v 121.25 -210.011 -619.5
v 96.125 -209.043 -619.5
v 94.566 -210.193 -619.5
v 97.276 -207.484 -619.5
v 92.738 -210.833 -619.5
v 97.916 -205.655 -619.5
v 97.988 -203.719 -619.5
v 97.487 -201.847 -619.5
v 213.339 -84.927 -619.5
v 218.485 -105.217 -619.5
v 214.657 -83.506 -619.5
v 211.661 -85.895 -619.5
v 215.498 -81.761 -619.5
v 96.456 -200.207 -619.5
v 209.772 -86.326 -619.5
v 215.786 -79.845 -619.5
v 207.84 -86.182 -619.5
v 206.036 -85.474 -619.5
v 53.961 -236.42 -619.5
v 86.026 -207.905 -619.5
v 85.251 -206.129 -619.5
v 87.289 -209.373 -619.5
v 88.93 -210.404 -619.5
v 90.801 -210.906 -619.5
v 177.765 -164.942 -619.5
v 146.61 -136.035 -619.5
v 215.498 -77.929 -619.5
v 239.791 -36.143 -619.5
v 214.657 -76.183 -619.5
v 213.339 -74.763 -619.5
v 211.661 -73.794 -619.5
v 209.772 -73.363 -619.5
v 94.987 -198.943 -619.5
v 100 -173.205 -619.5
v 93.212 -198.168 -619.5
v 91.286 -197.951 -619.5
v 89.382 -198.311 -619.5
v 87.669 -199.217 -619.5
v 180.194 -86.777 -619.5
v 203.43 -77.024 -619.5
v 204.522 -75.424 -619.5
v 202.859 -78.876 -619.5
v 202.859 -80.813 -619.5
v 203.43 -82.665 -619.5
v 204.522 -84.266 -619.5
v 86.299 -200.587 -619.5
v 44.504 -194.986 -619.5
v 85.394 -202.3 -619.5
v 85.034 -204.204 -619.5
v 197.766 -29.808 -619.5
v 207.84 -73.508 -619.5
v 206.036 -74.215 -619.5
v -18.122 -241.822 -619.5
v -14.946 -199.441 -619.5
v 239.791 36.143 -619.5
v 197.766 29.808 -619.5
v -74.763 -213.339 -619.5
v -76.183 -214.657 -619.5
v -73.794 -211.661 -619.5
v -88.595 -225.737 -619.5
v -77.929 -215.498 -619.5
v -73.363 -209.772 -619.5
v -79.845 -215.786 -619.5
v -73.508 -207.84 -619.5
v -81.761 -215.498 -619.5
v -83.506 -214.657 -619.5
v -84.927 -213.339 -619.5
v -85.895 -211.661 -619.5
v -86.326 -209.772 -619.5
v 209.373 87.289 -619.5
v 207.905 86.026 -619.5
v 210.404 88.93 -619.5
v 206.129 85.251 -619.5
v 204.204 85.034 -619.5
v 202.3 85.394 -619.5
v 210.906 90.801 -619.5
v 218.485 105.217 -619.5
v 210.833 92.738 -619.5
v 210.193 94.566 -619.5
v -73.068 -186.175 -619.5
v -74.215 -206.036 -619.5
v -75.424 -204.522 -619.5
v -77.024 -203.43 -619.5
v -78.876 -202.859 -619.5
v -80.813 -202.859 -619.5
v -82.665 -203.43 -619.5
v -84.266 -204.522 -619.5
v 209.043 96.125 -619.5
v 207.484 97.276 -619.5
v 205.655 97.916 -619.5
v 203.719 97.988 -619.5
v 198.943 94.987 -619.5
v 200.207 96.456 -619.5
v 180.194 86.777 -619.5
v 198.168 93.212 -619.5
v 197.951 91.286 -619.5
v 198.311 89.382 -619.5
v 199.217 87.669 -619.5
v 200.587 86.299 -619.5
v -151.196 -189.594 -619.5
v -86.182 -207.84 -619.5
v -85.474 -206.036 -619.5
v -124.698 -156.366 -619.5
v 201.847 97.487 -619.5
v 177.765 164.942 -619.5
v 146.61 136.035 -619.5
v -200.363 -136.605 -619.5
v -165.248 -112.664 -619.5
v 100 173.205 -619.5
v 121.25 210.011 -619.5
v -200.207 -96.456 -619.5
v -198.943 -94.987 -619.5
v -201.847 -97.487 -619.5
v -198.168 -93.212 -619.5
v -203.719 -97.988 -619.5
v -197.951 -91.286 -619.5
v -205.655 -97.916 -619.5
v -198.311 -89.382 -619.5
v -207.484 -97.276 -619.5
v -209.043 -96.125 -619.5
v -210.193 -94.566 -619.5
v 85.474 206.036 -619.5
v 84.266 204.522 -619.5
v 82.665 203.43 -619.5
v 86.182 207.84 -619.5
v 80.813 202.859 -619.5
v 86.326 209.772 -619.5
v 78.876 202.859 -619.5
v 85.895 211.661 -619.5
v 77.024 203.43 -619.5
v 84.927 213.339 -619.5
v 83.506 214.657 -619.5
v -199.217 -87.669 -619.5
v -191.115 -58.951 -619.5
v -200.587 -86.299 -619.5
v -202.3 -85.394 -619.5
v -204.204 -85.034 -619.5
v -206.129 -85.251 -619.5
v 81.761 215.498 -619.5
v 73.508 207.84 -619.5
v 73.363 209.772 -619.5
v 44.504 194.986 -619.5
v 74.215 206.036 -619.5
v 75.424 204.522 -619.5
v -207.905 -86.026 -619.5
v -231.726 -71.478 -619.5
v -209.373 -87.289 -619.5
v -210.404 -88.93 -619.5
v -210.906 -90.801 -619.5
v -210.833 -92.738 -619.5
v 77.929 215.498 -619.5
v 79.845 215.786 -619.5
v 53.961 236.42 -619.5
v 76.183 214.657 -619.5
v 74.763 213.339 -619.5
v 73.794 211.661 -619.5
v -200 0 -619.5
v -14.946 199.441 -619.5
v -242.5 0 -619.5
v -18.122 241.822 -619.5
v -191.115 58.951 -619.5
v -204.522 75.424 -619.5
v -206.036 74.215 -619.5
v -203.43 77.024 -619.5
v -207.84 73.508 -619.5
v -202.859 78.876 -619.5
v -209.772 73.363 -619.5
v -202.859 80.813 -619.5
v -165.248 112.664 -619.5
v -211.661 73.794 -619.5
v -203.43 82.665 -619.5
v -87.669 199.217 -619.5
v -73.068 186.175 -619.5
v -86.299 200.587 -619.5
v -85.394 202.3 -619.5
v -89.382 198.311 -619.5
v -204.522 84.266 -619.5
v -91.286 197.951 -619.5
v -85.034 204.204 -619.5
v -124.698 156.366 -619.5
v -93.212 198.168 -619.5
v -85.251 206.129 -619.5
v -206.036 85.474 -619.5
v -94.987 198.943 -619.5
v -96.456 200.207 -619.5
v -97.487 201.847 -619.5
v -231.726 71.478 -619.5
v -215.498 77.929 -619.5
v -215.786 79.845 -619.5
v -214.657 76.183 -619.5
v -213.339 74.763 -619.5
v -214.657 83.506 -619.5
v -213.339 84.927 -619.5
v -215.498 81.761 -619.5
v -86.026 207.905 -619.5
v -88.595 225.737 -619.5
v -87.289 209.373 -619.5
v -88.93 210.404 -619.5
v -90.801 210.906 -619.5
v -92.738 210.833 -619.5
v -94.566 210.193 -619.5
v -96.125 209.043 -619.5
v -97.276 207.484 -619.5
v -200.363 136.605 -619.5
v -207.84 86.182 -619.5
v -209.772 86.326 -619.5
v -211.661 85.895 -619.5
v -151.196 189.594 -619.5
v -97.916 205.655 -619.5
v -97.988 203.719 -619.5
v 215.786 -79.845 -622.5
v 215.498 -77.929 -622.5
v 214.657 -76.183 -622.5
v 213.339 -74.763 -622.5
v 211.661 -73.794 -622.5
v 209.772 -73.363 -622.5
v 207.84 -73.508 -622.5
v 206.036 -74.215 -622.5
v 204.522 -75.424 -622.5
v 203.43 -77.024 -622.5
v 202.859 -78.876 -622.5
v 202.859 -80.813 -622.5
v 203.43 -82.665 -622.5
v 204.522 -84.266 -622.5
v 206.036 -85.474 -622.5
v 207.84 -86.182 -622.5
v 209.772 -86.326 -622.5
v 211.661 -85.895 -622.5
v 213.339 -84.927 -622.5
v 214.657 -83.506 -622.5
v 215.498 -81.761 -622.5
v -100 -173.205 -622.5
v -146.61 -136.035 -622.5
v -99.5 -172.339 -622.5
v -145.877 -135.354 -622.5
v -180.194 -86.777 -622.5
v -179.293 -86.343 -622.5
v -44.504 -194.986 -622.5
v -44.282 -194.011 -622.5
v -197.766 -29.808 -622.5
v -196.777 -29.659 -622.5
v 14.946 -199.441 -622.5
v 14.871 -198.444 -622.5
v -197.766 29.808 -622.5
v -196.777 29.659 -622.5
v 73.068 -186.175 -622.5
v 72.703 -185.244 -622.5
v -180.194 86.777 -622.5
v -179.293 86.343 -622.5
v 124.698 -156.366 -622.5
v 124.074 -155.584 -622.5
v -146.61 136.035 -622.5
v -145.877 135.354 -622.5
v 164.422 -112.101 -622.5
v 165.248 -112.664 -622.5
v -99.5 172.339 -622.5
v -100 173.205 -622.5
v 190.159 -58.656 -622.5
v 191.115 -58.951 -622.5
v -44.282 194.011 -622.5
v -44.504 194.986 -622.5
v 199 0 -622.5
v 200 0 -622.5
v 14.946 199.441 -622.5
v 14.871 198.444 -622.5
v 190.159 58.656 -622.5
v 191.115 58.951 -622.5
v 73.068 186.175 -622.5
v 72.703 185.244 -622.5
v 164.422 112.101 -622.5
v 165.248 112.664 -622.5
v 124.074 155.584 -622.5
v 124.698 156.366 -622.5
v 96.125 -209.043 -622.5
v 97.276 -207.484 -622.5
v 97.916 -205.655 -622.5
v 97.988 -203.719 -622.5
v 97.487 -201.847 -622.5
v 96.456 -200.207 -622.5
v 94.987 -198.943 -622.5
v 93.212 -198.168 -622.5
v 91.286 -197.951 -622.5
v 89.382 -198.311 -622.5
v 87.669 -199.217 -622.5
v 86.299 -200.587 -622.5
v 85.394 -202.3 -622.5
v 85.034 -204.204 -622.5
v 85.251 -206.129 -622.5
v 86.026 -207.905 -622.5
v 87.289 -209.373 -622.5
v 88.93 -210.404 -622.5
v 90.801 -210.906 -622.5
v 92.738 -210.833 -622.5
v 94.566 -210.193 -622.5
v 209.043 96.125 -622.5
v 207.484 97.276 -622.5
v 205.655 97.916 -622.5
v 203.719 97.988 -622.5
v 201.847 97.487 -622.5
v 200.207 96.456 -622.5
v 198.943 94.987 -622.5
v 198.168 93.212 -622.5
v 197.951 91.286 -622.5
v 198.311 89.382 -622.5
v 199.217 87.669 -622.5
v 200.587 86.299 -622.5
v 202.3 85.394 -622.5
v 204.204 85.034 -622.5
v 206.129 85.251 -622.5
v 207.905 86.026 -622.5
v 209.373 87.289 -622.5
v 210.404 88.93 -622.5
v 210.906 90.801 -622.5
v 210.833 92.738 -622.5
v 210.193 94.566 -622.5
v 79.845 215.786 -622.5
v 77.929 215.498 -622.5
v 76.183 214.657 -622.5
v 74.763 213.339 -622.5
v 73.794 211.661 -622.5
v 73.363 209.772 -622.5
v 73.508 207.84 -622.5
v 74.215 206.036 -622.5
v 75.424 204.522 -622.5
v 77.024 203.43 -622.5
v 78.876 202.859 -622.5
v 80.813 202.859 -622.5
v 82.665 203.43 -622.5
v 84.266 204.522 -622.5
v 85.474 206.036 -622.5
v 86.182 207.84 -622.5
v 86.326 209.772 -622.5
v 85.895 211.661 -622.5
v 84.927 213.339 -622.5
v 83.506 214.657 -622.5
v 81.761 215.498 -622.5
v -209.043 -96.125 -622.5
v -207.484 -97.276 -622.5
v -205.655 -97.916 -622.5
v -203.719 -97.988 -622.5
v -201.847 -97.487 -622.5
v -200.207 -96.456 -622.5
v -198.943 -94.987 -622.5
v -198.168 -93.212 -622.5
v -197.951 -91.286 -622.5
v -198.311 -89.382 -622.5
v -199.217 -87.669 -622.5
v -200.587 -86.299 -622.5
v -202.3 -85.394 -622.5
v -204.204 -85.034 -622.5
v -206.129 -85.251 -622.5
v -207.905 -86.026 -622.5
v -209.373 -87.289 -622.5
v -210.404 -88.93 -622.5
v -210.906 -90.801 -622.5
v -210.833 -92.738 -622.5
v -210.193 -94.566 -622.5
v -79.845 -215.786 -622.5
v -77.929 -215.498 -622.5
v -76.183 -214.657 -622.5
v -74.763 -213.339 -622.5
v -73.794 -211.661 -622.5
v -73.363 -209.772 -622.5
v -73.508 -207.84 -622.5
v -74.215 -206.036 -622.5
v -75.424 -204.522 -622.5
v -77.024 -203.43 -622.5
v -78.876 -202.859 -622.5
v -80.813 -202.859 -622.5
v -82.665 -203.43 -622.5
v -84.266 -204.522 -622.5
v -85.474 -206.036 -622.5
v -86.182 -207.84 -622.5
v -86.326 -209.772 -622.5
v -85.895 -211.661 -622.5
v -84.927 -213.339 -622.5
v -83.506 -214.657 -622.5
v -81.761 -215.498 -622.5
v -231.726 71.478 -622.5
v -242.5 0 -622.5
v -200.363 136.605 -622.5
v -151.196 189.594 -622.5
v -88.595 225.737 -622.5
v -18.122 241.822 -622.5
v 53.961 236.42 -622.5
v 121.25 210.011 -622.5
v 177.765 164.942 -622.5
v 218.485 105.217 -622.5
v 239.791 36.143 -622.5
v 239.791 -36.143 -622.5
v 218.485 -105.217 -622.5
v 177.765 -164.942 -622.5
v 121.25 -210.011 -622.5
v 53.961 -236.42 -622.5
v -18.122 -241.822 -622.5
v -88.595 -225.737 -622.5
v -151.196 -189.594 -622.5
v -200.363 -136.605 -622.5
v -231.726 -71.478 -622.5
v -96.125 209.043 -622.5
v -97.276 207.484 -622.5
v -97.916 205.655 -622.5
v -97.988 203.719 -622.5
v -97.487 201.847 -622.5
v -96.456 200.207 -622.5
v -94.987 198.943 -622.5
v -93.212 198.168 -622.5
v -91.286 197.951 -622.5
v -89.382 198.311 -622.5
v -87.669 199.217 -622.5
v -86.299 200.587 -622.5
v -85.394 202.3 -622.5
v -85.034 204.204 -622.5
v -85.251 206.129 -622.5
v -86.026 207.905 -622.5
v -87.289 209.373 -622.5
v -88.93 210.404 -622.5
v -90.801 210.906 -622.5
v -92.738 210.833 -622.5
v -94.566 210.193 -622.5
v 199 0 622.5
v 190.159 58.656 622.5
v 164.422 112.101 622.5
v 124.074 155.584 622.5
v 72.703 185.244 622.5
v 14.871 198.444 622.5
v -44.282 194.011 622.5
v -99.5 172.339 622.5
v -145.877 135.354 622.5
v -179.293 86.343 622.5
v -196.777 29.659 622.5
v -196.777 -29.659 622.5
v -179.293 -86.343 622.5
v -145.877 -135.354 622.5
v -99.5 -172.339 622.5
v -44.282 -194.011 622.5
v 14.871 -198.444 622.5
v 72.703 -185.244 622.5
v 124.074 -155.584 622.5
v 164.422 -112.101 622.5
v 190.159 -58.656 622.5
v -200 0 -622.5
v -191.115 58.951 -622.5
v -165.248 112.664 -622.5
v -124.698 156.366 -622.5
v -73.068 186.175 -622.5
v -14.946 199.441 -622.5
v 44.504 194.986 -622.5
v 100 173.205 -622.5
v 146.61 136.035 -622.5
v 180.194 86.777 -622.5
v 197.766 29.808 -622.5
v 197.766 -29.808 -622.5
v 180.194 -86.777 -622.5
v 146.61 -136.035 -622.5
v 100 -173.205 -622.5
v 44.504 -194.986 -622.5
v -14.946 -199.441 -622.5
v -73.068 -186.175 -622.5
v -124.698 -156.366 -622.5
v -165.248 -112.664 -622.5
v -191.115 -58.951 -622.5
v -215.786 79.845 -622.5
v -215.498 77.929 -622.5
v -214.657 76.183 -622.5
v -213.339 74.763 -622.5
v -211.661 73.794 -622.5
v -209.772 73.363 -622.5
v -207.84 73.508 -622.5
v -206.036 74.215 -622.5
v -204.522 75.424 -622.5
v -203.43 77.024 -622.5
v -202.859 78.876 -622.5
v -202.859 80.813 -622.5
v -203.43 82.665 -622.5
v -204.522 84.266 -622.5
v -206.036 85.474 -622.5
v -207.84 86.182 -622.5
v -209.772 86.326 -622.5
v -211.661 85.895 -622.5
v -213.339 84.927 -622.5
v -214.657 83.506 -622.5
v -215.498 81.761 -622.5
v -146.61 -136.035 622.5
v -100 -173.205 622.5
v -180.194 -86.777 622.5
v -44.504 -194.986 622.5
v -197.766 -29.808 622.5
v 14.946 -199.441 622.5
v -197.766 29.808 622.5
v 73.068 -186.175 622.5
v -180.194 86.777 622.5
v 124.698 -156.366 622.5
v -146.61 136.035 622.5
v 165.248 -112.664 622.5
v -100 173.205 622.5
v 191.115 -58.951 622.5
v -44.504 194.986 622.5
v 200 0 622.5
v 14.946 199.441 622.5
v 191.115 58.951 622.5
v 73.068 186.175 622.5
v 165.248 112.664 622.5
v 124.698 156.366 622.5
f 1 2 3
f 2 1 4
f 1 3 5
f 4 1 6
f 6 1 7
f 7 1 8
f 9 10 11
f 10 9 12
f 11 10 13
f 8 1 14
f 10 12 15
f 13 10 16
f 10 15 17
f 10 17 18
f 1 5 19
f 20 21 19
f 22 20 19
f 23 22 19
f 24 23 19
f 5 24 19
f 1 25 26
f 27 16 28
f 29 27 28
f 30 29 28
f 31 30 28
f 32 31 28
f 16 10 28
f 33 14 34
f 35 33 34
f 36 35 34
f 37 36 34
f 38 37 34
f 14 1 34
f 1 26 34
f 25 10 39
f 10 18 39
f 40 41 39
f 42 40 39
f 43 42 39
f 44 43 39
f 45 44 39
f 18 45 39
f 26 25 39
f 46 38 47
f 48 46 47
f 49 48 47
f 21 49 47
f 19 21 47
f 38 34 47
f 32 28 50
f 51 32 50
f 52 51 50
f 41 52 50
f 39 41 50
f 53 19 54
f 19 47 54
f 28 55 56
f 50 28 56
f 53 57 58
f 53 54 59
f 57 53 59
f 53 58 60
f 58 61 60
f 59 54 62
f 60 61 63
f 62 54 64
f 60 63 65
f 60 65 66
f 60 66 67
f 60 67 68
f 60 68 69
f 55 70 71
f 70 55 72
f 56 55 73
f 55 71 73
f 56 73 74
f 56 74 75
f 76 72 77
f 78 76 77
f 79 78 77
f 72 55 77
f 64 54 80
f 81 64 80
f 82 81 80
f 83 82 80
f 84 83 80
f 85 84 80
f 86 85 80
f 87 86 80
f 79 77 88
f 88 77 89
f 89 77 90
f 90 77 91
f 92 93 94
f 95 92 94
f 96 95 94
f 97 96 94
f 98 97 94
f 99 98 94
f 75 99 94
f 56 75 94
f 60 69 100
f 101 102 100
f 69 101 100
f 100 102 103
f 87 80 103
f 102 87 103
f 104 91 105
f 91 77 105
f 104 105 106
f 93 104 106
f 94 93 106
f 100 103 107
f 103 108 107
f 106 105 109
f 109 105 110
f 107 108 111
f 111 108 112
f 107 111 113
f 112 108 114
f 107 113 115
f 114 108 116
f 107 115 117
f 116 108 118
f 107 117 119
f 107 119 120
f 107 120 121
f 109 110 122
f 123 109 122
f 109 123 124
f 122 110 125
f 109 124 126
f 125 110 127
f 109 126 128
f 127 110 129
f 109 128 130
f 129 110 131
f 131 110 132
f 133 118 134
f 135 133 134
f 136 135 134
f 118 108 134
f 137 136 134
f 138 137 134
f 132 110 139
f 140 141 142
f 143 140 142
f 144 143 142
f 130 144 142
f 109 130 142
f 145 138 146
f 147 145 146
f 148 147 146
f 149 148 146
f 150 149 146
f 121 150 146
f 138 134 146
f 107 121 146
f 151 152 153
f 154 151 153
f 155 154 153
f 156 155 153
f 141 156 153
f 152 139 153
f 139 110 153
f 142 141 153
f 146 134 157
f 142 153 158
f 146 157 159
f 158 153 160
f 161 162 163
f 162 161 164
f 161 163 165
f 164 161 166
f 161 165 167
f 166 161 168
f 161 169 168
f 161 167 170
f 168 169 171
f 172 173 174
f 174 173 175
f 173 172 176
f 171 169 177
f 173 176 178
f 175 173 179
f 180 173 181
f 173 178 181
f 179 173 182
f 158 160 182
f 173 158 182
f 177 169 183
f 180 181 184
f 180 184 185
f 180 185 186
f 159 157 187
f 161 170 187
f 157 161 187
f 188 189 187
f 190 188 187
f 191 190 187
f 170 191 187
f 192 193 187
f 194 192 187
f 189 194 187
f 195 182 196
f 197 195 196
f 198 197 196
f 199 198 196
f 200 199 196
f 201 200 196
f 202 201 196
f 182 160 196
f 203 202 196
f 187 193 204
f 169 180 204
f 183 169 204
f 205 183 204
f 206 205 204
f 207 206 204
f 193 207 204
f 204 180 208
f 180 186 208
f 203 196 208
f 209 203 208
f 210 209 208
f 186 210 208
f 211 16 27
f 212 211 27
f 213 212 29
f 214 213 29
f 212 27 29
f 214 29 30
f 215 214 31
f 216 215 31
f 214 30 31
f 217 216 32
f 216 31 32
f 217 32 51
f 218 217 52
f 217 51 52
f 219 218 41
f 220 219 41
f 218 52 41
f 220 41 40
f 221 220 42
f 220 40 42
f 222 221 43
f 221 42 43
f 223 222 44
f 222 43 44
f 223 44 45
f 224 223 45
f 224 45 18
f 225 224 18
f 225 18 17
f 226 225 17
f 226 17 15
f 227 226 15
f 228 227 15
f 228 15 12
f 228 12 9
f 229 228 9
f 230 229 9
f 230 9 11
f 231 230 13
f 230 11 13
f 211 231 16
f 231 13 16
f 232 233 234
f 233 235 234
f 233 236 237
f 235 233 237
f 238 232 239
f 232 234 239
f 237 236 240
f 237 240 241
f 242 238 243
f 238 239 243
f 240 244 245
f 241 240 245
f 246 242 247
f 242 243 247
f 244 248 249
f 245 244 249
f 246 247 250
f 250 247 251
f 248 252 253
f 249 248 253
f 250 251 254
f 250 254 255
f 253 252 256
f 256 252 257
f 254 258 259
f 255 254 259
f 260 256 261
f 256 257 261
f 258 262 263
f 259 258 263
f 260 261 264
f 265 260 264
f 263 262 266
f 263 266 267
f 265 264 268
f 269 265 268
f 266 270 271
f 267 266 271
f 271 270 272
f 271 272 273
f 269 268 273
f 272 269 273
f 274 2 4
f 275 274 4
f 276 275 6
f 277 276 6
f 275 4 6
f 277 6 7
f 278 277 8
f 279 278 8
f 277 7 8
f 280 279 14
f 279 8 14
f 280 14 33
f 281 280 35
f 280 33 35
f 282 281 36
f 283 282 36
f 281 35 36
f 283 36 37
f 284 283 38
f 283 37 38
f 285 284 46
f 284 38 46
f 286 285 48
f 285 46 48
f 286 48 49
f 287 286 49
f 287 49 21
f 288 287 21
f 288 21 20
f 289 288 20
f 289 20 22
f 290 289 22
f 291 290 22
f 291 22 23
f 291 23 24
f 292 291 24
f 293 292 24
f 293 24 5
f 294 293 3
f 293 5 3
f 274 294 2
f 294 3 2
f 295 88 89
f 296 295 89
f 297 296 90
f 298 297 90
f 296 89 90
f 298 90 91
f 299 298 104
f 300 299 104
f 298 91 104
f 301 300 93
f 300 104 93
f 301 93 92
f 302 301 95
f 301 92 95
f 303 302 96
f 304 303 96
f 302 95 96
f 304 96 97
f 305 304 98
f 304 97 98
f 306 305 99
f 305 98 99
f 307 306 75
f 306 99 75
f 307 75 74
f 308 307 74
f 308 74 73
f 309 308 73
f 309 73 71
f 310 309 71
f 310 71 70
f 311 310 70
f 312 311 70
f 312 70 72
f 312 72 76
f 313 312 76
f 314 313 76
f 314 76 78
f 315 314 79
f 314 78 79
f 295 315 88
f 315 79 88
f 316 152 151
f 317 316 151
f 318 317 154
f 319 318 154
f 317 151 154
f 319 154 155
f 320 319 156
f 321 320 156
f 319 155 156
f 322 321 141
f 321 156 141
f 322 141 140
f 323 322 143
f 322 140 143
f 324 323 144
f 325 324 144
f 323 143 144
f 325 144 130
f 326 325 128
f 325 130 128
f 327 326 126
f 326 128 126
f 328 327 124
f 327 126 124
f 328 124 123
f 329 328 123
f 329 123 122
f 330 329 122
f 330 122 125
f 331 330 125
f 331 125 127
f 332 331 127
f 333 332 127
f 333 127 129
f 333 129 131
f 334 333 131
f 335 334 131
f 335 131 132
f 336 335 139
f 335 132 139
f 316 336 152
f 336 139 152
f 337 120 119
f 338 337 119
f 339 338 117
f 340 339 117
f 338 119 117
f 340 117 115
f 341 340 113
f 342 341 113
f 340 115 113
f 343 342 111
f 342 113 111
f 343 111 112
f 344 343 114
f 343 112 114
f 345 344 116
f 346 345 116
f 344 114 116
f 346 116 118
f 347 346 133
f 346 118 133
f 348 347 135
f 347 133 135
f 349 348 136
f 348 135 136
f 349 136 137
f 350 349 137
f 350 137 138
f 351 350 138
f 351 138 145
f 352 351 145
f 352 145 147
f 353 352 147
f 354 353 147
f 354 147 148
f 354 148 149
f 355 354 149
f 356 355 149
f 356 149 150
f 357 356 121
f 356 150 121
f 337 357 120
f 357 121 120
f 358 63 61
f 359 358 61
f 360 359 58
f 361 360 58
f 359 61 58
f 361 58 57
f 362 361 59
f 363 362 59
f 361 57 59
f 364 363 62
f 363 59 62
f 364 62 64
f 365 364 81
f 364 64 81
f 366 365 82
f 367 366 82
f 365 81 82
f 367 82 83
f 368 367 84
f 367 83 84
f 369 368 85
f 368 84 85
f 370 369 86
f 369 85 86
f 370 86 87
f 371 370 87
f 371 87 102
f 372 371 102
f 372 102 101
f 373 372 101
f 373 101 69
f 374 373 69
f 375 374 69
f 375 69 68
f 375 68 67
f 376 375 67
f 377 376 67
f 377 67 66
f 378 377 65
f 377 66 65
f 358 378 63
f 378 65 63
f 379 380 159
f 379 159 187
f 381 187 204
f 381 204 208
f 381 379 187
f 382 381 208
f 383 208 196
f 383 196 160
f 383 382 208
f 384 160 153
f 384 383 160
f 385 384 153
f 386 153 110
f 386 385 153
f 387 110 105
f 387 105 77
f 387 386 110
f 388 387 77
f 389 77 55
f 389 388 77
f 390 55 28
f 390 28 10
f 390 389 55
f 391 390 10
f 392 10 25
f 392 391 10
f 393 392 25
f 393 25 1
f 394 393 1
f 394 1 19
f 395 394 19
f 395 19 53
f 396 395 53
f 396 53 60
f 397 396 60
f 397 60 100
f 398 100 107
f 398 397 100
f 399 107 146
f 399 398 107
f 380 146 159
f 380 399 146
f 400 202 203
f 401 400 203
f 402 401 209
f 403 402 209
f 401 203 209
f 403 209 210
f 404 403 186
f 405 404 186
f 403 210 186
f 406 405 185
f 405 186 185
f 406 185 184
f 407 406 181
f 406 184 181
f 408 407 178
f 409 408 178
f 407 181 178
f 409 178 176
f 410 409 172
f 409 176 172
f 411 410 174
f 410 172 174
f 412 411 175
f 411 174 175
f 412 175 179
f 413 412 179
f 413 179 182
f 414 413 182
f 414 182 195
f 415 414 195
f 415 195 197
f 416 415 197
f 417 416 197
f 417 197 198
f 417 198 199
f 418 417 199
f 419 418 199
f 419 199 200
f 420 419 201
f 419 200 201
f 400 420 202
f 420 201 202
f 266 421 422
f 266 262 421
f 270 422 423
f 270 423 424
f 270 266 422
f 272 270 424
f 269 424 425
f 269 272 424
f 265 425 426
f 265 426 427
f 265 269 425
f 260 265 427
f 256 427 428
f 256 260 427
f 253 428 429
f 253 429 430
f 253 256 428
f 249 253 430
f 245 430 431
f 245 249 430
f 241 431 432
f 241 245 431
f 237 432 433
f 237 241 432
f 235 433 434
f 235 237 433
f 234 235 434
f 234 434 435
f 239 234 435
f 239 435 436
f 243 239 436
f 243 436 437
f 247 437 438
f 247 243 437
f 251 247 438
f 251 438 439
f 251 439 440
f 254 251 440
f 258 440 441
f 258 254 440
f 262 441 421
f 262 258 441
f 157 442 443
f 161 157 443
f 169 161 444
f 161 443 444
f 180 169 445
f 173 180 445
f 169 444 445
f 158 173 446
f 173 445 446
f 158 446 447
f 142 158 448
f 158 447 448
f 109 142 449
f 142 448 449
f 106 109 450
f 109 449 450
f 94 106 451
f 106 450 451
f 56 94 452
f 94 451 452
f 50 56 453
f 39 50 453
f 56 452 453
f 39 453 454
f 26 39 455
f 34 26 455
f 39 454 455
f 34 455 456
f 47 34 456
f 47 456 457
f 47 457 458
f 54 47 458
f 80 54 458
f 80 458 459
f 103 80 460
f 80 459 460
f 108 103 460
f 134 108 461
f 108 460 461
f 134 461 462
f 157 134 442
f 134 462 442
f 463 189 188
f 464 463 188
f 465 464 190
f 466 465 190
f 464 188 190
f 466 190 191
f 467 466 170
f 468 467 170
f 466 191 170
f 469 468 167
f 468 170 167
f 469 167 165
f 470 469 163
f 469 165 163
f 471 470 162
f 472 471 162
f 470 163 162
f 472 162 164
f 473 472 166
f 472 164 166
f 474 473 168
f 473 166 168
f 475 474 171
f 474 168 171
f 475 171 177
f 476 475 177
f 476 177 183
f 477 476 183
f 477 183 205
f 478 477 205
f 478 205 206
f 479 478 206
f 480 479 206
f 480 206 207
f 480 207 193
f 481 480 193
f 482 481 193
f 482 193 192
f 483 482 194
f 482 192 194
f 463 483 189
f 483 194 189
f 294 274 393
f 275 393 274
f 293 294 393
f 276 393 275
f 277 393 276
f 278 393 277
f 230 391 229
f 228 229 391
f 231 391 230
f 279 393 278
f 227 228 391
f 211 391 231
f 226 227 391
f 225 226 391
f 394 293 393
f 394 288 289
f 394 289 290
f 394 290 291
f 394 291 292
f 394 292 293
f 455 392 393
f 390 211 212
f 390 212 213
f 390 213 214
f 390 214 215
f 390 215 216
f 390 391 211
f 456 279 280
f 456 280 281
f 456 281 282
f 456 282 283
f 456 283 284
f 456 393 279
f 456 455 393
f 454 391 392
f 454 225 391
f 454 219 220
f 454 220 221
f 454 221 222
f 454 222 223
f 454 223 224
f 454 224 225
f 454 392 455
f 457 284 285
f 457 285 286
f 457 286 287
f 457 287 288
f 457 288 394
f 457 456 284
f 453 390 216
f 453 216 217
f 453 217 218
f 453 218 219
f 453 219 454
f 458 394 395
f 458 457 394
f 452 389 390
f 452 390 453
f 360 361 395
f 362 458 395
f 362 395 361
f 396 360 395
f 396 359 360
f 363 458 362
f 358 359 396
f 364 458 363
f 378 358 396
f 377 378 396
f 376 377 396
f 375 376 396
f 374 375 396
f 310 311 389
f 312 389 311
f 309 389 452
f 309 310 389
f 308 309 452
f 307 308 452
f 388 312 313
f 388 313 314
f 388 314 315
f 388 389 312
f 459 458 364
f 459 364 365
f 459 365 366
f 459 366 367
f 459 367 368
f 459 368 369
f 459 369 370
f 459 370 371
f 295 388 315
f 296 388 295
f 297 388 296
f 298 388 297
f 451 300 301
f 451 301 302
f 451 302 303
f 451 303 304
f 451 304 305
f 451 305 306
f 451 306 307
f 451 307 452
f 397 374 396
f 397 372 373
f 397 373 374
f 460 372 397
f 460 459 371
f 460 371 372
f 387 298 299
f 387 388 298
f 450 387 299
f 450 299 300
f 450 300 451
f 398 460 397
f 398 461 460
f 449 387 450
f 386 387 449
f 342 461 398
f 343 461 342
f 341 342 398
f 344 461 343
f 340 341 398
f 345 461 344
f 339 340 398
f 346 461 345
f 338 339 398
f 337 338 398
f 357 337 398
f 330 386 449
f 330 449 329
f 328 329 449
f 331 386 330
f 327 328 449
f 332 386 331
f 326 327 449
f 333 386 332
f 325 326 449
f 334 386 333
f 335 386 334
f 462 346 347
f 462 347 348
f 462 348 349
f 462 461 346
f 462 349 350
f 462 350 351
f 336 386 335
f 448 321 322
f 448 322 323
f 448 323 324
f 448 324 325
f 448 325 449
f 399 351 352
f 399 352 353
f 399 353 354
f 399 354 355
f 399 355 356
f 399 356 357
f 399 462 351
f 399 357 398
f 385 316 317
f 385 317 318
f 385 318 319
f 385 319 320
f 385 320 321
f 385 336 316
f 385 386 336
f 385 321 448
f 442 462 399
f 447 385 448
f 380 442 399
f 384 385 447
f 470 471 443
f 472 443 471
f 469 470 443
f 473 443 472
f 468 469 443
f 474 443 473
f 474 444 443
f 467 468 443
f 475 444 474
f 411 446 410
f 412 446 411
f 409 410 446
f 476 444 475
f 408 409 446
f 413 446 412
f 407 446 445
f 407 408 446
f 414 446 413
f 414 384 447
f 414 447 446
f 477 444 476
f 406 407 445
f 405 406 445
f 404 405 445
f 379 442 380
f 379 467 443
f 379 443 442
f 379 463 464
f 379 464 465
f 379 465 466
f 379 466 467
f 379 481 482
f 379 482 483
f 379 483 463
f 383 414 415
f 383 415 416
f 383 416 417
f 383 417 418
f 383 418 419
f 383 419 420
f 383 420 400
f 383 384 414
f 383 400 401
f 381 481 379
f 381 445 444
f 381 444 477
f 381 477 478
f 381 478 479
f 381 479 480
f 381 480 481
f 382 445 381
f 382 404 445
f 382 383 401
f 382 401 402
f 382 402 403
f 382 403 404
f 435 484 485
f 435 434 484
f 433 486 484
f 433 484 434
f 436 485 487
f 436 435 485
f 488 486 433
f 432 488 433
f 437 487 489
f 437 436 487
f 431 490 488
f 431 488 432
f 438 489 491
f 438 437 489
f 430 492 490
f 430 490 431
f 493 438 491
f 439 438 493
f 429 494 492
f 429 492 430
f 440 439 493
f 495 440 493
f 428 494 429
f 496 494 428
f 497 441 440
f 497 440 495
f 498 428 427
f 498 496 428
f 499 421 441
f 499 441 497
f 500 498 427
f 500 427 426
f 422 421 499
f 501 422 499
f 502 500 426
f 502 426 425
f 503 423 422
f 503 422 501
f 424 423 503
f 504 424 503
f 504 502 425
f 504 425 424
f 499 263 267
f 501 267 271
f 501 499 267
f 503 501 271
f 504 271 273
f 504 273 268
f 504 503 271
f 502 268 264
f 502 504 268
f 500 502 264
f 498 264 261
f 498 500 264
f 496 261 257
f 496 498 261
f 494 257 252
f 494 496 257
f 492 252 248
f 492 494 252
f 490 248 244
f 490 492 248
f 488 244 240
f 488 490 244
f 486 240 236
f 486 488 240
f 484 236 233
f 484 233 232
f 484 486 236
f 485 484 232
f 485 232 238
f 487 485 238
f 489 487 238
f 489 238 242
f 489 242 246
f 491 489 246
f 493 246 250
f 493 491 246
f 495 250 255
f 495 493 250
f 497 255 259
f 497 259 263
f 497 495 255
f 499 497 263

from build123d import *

# Parameters (mm, degrees)
SKETCH1_R           = 200
SKETCH1_R_2         = 199
EXTRUDE_THIN1_DEPTH = 622.5
SKETCH2_R           = 242.5
SKETCH2_R_2         = 200
EXTRUDE1_DEPTH      = 3
SKETCH3_R           = 6.5
CUT_EXTRUDE1_DEPTH  = 3
CIRPATTERN1_COUNT   = 8


with BuildPart() as part:
    # Sketch1 → Extrude-Thin1 (new, symmetric)
    with BuildSketch(Plane.XY):
        Circle(SKETCH1_R)
        Circle(SKETCH1_R_2, mode=Mode.SUBTRACT)
    extrude(amount=EXTRUDE_THIN1_DEPTH, both=True)


with BuildPart() as body_2:
    # Sketch2 → Extrude1 (new body)
    with BuildSketch(Plane(origin=(0, 0, -622.5), x_dir=(-1, 0, 0), z_dir=(0, 0, -1))):
        Circle(SKETCH2_R)
        Circle(SKETCH2_R_2, mode=Mode.SUBTRACT)
    extrude(amount=-EXTRUDE1_DEPTH)

    # Sketch3 → Cut-Extrude1 (cut)
    with BuildSketch(Plane.XY.offset(-619.5)):
        with Locations((209.286487732, -79.844636971)):
            Circle(SKETCH3_R)
    cut_extrude1 = extrude(amount=-CUT_EXTRUDE1_DEPTH, mode=Mode.SUBTRACT)

    # CirPattern1: Cut-Extrude1 ×8 about axis
    cirpattern1_axis = Axis((0, 0, 0), (0, 0, 1))
    for i in range(1, CIRPATTERN1_COUNT):
        add(cut_extrude1.rotate(cirpattern1_axis, i * 360 / CIRPATTERN1_COUNT), mode=Mode.SUBTRACT)


solid = Compound([part.part, body_2.part])
